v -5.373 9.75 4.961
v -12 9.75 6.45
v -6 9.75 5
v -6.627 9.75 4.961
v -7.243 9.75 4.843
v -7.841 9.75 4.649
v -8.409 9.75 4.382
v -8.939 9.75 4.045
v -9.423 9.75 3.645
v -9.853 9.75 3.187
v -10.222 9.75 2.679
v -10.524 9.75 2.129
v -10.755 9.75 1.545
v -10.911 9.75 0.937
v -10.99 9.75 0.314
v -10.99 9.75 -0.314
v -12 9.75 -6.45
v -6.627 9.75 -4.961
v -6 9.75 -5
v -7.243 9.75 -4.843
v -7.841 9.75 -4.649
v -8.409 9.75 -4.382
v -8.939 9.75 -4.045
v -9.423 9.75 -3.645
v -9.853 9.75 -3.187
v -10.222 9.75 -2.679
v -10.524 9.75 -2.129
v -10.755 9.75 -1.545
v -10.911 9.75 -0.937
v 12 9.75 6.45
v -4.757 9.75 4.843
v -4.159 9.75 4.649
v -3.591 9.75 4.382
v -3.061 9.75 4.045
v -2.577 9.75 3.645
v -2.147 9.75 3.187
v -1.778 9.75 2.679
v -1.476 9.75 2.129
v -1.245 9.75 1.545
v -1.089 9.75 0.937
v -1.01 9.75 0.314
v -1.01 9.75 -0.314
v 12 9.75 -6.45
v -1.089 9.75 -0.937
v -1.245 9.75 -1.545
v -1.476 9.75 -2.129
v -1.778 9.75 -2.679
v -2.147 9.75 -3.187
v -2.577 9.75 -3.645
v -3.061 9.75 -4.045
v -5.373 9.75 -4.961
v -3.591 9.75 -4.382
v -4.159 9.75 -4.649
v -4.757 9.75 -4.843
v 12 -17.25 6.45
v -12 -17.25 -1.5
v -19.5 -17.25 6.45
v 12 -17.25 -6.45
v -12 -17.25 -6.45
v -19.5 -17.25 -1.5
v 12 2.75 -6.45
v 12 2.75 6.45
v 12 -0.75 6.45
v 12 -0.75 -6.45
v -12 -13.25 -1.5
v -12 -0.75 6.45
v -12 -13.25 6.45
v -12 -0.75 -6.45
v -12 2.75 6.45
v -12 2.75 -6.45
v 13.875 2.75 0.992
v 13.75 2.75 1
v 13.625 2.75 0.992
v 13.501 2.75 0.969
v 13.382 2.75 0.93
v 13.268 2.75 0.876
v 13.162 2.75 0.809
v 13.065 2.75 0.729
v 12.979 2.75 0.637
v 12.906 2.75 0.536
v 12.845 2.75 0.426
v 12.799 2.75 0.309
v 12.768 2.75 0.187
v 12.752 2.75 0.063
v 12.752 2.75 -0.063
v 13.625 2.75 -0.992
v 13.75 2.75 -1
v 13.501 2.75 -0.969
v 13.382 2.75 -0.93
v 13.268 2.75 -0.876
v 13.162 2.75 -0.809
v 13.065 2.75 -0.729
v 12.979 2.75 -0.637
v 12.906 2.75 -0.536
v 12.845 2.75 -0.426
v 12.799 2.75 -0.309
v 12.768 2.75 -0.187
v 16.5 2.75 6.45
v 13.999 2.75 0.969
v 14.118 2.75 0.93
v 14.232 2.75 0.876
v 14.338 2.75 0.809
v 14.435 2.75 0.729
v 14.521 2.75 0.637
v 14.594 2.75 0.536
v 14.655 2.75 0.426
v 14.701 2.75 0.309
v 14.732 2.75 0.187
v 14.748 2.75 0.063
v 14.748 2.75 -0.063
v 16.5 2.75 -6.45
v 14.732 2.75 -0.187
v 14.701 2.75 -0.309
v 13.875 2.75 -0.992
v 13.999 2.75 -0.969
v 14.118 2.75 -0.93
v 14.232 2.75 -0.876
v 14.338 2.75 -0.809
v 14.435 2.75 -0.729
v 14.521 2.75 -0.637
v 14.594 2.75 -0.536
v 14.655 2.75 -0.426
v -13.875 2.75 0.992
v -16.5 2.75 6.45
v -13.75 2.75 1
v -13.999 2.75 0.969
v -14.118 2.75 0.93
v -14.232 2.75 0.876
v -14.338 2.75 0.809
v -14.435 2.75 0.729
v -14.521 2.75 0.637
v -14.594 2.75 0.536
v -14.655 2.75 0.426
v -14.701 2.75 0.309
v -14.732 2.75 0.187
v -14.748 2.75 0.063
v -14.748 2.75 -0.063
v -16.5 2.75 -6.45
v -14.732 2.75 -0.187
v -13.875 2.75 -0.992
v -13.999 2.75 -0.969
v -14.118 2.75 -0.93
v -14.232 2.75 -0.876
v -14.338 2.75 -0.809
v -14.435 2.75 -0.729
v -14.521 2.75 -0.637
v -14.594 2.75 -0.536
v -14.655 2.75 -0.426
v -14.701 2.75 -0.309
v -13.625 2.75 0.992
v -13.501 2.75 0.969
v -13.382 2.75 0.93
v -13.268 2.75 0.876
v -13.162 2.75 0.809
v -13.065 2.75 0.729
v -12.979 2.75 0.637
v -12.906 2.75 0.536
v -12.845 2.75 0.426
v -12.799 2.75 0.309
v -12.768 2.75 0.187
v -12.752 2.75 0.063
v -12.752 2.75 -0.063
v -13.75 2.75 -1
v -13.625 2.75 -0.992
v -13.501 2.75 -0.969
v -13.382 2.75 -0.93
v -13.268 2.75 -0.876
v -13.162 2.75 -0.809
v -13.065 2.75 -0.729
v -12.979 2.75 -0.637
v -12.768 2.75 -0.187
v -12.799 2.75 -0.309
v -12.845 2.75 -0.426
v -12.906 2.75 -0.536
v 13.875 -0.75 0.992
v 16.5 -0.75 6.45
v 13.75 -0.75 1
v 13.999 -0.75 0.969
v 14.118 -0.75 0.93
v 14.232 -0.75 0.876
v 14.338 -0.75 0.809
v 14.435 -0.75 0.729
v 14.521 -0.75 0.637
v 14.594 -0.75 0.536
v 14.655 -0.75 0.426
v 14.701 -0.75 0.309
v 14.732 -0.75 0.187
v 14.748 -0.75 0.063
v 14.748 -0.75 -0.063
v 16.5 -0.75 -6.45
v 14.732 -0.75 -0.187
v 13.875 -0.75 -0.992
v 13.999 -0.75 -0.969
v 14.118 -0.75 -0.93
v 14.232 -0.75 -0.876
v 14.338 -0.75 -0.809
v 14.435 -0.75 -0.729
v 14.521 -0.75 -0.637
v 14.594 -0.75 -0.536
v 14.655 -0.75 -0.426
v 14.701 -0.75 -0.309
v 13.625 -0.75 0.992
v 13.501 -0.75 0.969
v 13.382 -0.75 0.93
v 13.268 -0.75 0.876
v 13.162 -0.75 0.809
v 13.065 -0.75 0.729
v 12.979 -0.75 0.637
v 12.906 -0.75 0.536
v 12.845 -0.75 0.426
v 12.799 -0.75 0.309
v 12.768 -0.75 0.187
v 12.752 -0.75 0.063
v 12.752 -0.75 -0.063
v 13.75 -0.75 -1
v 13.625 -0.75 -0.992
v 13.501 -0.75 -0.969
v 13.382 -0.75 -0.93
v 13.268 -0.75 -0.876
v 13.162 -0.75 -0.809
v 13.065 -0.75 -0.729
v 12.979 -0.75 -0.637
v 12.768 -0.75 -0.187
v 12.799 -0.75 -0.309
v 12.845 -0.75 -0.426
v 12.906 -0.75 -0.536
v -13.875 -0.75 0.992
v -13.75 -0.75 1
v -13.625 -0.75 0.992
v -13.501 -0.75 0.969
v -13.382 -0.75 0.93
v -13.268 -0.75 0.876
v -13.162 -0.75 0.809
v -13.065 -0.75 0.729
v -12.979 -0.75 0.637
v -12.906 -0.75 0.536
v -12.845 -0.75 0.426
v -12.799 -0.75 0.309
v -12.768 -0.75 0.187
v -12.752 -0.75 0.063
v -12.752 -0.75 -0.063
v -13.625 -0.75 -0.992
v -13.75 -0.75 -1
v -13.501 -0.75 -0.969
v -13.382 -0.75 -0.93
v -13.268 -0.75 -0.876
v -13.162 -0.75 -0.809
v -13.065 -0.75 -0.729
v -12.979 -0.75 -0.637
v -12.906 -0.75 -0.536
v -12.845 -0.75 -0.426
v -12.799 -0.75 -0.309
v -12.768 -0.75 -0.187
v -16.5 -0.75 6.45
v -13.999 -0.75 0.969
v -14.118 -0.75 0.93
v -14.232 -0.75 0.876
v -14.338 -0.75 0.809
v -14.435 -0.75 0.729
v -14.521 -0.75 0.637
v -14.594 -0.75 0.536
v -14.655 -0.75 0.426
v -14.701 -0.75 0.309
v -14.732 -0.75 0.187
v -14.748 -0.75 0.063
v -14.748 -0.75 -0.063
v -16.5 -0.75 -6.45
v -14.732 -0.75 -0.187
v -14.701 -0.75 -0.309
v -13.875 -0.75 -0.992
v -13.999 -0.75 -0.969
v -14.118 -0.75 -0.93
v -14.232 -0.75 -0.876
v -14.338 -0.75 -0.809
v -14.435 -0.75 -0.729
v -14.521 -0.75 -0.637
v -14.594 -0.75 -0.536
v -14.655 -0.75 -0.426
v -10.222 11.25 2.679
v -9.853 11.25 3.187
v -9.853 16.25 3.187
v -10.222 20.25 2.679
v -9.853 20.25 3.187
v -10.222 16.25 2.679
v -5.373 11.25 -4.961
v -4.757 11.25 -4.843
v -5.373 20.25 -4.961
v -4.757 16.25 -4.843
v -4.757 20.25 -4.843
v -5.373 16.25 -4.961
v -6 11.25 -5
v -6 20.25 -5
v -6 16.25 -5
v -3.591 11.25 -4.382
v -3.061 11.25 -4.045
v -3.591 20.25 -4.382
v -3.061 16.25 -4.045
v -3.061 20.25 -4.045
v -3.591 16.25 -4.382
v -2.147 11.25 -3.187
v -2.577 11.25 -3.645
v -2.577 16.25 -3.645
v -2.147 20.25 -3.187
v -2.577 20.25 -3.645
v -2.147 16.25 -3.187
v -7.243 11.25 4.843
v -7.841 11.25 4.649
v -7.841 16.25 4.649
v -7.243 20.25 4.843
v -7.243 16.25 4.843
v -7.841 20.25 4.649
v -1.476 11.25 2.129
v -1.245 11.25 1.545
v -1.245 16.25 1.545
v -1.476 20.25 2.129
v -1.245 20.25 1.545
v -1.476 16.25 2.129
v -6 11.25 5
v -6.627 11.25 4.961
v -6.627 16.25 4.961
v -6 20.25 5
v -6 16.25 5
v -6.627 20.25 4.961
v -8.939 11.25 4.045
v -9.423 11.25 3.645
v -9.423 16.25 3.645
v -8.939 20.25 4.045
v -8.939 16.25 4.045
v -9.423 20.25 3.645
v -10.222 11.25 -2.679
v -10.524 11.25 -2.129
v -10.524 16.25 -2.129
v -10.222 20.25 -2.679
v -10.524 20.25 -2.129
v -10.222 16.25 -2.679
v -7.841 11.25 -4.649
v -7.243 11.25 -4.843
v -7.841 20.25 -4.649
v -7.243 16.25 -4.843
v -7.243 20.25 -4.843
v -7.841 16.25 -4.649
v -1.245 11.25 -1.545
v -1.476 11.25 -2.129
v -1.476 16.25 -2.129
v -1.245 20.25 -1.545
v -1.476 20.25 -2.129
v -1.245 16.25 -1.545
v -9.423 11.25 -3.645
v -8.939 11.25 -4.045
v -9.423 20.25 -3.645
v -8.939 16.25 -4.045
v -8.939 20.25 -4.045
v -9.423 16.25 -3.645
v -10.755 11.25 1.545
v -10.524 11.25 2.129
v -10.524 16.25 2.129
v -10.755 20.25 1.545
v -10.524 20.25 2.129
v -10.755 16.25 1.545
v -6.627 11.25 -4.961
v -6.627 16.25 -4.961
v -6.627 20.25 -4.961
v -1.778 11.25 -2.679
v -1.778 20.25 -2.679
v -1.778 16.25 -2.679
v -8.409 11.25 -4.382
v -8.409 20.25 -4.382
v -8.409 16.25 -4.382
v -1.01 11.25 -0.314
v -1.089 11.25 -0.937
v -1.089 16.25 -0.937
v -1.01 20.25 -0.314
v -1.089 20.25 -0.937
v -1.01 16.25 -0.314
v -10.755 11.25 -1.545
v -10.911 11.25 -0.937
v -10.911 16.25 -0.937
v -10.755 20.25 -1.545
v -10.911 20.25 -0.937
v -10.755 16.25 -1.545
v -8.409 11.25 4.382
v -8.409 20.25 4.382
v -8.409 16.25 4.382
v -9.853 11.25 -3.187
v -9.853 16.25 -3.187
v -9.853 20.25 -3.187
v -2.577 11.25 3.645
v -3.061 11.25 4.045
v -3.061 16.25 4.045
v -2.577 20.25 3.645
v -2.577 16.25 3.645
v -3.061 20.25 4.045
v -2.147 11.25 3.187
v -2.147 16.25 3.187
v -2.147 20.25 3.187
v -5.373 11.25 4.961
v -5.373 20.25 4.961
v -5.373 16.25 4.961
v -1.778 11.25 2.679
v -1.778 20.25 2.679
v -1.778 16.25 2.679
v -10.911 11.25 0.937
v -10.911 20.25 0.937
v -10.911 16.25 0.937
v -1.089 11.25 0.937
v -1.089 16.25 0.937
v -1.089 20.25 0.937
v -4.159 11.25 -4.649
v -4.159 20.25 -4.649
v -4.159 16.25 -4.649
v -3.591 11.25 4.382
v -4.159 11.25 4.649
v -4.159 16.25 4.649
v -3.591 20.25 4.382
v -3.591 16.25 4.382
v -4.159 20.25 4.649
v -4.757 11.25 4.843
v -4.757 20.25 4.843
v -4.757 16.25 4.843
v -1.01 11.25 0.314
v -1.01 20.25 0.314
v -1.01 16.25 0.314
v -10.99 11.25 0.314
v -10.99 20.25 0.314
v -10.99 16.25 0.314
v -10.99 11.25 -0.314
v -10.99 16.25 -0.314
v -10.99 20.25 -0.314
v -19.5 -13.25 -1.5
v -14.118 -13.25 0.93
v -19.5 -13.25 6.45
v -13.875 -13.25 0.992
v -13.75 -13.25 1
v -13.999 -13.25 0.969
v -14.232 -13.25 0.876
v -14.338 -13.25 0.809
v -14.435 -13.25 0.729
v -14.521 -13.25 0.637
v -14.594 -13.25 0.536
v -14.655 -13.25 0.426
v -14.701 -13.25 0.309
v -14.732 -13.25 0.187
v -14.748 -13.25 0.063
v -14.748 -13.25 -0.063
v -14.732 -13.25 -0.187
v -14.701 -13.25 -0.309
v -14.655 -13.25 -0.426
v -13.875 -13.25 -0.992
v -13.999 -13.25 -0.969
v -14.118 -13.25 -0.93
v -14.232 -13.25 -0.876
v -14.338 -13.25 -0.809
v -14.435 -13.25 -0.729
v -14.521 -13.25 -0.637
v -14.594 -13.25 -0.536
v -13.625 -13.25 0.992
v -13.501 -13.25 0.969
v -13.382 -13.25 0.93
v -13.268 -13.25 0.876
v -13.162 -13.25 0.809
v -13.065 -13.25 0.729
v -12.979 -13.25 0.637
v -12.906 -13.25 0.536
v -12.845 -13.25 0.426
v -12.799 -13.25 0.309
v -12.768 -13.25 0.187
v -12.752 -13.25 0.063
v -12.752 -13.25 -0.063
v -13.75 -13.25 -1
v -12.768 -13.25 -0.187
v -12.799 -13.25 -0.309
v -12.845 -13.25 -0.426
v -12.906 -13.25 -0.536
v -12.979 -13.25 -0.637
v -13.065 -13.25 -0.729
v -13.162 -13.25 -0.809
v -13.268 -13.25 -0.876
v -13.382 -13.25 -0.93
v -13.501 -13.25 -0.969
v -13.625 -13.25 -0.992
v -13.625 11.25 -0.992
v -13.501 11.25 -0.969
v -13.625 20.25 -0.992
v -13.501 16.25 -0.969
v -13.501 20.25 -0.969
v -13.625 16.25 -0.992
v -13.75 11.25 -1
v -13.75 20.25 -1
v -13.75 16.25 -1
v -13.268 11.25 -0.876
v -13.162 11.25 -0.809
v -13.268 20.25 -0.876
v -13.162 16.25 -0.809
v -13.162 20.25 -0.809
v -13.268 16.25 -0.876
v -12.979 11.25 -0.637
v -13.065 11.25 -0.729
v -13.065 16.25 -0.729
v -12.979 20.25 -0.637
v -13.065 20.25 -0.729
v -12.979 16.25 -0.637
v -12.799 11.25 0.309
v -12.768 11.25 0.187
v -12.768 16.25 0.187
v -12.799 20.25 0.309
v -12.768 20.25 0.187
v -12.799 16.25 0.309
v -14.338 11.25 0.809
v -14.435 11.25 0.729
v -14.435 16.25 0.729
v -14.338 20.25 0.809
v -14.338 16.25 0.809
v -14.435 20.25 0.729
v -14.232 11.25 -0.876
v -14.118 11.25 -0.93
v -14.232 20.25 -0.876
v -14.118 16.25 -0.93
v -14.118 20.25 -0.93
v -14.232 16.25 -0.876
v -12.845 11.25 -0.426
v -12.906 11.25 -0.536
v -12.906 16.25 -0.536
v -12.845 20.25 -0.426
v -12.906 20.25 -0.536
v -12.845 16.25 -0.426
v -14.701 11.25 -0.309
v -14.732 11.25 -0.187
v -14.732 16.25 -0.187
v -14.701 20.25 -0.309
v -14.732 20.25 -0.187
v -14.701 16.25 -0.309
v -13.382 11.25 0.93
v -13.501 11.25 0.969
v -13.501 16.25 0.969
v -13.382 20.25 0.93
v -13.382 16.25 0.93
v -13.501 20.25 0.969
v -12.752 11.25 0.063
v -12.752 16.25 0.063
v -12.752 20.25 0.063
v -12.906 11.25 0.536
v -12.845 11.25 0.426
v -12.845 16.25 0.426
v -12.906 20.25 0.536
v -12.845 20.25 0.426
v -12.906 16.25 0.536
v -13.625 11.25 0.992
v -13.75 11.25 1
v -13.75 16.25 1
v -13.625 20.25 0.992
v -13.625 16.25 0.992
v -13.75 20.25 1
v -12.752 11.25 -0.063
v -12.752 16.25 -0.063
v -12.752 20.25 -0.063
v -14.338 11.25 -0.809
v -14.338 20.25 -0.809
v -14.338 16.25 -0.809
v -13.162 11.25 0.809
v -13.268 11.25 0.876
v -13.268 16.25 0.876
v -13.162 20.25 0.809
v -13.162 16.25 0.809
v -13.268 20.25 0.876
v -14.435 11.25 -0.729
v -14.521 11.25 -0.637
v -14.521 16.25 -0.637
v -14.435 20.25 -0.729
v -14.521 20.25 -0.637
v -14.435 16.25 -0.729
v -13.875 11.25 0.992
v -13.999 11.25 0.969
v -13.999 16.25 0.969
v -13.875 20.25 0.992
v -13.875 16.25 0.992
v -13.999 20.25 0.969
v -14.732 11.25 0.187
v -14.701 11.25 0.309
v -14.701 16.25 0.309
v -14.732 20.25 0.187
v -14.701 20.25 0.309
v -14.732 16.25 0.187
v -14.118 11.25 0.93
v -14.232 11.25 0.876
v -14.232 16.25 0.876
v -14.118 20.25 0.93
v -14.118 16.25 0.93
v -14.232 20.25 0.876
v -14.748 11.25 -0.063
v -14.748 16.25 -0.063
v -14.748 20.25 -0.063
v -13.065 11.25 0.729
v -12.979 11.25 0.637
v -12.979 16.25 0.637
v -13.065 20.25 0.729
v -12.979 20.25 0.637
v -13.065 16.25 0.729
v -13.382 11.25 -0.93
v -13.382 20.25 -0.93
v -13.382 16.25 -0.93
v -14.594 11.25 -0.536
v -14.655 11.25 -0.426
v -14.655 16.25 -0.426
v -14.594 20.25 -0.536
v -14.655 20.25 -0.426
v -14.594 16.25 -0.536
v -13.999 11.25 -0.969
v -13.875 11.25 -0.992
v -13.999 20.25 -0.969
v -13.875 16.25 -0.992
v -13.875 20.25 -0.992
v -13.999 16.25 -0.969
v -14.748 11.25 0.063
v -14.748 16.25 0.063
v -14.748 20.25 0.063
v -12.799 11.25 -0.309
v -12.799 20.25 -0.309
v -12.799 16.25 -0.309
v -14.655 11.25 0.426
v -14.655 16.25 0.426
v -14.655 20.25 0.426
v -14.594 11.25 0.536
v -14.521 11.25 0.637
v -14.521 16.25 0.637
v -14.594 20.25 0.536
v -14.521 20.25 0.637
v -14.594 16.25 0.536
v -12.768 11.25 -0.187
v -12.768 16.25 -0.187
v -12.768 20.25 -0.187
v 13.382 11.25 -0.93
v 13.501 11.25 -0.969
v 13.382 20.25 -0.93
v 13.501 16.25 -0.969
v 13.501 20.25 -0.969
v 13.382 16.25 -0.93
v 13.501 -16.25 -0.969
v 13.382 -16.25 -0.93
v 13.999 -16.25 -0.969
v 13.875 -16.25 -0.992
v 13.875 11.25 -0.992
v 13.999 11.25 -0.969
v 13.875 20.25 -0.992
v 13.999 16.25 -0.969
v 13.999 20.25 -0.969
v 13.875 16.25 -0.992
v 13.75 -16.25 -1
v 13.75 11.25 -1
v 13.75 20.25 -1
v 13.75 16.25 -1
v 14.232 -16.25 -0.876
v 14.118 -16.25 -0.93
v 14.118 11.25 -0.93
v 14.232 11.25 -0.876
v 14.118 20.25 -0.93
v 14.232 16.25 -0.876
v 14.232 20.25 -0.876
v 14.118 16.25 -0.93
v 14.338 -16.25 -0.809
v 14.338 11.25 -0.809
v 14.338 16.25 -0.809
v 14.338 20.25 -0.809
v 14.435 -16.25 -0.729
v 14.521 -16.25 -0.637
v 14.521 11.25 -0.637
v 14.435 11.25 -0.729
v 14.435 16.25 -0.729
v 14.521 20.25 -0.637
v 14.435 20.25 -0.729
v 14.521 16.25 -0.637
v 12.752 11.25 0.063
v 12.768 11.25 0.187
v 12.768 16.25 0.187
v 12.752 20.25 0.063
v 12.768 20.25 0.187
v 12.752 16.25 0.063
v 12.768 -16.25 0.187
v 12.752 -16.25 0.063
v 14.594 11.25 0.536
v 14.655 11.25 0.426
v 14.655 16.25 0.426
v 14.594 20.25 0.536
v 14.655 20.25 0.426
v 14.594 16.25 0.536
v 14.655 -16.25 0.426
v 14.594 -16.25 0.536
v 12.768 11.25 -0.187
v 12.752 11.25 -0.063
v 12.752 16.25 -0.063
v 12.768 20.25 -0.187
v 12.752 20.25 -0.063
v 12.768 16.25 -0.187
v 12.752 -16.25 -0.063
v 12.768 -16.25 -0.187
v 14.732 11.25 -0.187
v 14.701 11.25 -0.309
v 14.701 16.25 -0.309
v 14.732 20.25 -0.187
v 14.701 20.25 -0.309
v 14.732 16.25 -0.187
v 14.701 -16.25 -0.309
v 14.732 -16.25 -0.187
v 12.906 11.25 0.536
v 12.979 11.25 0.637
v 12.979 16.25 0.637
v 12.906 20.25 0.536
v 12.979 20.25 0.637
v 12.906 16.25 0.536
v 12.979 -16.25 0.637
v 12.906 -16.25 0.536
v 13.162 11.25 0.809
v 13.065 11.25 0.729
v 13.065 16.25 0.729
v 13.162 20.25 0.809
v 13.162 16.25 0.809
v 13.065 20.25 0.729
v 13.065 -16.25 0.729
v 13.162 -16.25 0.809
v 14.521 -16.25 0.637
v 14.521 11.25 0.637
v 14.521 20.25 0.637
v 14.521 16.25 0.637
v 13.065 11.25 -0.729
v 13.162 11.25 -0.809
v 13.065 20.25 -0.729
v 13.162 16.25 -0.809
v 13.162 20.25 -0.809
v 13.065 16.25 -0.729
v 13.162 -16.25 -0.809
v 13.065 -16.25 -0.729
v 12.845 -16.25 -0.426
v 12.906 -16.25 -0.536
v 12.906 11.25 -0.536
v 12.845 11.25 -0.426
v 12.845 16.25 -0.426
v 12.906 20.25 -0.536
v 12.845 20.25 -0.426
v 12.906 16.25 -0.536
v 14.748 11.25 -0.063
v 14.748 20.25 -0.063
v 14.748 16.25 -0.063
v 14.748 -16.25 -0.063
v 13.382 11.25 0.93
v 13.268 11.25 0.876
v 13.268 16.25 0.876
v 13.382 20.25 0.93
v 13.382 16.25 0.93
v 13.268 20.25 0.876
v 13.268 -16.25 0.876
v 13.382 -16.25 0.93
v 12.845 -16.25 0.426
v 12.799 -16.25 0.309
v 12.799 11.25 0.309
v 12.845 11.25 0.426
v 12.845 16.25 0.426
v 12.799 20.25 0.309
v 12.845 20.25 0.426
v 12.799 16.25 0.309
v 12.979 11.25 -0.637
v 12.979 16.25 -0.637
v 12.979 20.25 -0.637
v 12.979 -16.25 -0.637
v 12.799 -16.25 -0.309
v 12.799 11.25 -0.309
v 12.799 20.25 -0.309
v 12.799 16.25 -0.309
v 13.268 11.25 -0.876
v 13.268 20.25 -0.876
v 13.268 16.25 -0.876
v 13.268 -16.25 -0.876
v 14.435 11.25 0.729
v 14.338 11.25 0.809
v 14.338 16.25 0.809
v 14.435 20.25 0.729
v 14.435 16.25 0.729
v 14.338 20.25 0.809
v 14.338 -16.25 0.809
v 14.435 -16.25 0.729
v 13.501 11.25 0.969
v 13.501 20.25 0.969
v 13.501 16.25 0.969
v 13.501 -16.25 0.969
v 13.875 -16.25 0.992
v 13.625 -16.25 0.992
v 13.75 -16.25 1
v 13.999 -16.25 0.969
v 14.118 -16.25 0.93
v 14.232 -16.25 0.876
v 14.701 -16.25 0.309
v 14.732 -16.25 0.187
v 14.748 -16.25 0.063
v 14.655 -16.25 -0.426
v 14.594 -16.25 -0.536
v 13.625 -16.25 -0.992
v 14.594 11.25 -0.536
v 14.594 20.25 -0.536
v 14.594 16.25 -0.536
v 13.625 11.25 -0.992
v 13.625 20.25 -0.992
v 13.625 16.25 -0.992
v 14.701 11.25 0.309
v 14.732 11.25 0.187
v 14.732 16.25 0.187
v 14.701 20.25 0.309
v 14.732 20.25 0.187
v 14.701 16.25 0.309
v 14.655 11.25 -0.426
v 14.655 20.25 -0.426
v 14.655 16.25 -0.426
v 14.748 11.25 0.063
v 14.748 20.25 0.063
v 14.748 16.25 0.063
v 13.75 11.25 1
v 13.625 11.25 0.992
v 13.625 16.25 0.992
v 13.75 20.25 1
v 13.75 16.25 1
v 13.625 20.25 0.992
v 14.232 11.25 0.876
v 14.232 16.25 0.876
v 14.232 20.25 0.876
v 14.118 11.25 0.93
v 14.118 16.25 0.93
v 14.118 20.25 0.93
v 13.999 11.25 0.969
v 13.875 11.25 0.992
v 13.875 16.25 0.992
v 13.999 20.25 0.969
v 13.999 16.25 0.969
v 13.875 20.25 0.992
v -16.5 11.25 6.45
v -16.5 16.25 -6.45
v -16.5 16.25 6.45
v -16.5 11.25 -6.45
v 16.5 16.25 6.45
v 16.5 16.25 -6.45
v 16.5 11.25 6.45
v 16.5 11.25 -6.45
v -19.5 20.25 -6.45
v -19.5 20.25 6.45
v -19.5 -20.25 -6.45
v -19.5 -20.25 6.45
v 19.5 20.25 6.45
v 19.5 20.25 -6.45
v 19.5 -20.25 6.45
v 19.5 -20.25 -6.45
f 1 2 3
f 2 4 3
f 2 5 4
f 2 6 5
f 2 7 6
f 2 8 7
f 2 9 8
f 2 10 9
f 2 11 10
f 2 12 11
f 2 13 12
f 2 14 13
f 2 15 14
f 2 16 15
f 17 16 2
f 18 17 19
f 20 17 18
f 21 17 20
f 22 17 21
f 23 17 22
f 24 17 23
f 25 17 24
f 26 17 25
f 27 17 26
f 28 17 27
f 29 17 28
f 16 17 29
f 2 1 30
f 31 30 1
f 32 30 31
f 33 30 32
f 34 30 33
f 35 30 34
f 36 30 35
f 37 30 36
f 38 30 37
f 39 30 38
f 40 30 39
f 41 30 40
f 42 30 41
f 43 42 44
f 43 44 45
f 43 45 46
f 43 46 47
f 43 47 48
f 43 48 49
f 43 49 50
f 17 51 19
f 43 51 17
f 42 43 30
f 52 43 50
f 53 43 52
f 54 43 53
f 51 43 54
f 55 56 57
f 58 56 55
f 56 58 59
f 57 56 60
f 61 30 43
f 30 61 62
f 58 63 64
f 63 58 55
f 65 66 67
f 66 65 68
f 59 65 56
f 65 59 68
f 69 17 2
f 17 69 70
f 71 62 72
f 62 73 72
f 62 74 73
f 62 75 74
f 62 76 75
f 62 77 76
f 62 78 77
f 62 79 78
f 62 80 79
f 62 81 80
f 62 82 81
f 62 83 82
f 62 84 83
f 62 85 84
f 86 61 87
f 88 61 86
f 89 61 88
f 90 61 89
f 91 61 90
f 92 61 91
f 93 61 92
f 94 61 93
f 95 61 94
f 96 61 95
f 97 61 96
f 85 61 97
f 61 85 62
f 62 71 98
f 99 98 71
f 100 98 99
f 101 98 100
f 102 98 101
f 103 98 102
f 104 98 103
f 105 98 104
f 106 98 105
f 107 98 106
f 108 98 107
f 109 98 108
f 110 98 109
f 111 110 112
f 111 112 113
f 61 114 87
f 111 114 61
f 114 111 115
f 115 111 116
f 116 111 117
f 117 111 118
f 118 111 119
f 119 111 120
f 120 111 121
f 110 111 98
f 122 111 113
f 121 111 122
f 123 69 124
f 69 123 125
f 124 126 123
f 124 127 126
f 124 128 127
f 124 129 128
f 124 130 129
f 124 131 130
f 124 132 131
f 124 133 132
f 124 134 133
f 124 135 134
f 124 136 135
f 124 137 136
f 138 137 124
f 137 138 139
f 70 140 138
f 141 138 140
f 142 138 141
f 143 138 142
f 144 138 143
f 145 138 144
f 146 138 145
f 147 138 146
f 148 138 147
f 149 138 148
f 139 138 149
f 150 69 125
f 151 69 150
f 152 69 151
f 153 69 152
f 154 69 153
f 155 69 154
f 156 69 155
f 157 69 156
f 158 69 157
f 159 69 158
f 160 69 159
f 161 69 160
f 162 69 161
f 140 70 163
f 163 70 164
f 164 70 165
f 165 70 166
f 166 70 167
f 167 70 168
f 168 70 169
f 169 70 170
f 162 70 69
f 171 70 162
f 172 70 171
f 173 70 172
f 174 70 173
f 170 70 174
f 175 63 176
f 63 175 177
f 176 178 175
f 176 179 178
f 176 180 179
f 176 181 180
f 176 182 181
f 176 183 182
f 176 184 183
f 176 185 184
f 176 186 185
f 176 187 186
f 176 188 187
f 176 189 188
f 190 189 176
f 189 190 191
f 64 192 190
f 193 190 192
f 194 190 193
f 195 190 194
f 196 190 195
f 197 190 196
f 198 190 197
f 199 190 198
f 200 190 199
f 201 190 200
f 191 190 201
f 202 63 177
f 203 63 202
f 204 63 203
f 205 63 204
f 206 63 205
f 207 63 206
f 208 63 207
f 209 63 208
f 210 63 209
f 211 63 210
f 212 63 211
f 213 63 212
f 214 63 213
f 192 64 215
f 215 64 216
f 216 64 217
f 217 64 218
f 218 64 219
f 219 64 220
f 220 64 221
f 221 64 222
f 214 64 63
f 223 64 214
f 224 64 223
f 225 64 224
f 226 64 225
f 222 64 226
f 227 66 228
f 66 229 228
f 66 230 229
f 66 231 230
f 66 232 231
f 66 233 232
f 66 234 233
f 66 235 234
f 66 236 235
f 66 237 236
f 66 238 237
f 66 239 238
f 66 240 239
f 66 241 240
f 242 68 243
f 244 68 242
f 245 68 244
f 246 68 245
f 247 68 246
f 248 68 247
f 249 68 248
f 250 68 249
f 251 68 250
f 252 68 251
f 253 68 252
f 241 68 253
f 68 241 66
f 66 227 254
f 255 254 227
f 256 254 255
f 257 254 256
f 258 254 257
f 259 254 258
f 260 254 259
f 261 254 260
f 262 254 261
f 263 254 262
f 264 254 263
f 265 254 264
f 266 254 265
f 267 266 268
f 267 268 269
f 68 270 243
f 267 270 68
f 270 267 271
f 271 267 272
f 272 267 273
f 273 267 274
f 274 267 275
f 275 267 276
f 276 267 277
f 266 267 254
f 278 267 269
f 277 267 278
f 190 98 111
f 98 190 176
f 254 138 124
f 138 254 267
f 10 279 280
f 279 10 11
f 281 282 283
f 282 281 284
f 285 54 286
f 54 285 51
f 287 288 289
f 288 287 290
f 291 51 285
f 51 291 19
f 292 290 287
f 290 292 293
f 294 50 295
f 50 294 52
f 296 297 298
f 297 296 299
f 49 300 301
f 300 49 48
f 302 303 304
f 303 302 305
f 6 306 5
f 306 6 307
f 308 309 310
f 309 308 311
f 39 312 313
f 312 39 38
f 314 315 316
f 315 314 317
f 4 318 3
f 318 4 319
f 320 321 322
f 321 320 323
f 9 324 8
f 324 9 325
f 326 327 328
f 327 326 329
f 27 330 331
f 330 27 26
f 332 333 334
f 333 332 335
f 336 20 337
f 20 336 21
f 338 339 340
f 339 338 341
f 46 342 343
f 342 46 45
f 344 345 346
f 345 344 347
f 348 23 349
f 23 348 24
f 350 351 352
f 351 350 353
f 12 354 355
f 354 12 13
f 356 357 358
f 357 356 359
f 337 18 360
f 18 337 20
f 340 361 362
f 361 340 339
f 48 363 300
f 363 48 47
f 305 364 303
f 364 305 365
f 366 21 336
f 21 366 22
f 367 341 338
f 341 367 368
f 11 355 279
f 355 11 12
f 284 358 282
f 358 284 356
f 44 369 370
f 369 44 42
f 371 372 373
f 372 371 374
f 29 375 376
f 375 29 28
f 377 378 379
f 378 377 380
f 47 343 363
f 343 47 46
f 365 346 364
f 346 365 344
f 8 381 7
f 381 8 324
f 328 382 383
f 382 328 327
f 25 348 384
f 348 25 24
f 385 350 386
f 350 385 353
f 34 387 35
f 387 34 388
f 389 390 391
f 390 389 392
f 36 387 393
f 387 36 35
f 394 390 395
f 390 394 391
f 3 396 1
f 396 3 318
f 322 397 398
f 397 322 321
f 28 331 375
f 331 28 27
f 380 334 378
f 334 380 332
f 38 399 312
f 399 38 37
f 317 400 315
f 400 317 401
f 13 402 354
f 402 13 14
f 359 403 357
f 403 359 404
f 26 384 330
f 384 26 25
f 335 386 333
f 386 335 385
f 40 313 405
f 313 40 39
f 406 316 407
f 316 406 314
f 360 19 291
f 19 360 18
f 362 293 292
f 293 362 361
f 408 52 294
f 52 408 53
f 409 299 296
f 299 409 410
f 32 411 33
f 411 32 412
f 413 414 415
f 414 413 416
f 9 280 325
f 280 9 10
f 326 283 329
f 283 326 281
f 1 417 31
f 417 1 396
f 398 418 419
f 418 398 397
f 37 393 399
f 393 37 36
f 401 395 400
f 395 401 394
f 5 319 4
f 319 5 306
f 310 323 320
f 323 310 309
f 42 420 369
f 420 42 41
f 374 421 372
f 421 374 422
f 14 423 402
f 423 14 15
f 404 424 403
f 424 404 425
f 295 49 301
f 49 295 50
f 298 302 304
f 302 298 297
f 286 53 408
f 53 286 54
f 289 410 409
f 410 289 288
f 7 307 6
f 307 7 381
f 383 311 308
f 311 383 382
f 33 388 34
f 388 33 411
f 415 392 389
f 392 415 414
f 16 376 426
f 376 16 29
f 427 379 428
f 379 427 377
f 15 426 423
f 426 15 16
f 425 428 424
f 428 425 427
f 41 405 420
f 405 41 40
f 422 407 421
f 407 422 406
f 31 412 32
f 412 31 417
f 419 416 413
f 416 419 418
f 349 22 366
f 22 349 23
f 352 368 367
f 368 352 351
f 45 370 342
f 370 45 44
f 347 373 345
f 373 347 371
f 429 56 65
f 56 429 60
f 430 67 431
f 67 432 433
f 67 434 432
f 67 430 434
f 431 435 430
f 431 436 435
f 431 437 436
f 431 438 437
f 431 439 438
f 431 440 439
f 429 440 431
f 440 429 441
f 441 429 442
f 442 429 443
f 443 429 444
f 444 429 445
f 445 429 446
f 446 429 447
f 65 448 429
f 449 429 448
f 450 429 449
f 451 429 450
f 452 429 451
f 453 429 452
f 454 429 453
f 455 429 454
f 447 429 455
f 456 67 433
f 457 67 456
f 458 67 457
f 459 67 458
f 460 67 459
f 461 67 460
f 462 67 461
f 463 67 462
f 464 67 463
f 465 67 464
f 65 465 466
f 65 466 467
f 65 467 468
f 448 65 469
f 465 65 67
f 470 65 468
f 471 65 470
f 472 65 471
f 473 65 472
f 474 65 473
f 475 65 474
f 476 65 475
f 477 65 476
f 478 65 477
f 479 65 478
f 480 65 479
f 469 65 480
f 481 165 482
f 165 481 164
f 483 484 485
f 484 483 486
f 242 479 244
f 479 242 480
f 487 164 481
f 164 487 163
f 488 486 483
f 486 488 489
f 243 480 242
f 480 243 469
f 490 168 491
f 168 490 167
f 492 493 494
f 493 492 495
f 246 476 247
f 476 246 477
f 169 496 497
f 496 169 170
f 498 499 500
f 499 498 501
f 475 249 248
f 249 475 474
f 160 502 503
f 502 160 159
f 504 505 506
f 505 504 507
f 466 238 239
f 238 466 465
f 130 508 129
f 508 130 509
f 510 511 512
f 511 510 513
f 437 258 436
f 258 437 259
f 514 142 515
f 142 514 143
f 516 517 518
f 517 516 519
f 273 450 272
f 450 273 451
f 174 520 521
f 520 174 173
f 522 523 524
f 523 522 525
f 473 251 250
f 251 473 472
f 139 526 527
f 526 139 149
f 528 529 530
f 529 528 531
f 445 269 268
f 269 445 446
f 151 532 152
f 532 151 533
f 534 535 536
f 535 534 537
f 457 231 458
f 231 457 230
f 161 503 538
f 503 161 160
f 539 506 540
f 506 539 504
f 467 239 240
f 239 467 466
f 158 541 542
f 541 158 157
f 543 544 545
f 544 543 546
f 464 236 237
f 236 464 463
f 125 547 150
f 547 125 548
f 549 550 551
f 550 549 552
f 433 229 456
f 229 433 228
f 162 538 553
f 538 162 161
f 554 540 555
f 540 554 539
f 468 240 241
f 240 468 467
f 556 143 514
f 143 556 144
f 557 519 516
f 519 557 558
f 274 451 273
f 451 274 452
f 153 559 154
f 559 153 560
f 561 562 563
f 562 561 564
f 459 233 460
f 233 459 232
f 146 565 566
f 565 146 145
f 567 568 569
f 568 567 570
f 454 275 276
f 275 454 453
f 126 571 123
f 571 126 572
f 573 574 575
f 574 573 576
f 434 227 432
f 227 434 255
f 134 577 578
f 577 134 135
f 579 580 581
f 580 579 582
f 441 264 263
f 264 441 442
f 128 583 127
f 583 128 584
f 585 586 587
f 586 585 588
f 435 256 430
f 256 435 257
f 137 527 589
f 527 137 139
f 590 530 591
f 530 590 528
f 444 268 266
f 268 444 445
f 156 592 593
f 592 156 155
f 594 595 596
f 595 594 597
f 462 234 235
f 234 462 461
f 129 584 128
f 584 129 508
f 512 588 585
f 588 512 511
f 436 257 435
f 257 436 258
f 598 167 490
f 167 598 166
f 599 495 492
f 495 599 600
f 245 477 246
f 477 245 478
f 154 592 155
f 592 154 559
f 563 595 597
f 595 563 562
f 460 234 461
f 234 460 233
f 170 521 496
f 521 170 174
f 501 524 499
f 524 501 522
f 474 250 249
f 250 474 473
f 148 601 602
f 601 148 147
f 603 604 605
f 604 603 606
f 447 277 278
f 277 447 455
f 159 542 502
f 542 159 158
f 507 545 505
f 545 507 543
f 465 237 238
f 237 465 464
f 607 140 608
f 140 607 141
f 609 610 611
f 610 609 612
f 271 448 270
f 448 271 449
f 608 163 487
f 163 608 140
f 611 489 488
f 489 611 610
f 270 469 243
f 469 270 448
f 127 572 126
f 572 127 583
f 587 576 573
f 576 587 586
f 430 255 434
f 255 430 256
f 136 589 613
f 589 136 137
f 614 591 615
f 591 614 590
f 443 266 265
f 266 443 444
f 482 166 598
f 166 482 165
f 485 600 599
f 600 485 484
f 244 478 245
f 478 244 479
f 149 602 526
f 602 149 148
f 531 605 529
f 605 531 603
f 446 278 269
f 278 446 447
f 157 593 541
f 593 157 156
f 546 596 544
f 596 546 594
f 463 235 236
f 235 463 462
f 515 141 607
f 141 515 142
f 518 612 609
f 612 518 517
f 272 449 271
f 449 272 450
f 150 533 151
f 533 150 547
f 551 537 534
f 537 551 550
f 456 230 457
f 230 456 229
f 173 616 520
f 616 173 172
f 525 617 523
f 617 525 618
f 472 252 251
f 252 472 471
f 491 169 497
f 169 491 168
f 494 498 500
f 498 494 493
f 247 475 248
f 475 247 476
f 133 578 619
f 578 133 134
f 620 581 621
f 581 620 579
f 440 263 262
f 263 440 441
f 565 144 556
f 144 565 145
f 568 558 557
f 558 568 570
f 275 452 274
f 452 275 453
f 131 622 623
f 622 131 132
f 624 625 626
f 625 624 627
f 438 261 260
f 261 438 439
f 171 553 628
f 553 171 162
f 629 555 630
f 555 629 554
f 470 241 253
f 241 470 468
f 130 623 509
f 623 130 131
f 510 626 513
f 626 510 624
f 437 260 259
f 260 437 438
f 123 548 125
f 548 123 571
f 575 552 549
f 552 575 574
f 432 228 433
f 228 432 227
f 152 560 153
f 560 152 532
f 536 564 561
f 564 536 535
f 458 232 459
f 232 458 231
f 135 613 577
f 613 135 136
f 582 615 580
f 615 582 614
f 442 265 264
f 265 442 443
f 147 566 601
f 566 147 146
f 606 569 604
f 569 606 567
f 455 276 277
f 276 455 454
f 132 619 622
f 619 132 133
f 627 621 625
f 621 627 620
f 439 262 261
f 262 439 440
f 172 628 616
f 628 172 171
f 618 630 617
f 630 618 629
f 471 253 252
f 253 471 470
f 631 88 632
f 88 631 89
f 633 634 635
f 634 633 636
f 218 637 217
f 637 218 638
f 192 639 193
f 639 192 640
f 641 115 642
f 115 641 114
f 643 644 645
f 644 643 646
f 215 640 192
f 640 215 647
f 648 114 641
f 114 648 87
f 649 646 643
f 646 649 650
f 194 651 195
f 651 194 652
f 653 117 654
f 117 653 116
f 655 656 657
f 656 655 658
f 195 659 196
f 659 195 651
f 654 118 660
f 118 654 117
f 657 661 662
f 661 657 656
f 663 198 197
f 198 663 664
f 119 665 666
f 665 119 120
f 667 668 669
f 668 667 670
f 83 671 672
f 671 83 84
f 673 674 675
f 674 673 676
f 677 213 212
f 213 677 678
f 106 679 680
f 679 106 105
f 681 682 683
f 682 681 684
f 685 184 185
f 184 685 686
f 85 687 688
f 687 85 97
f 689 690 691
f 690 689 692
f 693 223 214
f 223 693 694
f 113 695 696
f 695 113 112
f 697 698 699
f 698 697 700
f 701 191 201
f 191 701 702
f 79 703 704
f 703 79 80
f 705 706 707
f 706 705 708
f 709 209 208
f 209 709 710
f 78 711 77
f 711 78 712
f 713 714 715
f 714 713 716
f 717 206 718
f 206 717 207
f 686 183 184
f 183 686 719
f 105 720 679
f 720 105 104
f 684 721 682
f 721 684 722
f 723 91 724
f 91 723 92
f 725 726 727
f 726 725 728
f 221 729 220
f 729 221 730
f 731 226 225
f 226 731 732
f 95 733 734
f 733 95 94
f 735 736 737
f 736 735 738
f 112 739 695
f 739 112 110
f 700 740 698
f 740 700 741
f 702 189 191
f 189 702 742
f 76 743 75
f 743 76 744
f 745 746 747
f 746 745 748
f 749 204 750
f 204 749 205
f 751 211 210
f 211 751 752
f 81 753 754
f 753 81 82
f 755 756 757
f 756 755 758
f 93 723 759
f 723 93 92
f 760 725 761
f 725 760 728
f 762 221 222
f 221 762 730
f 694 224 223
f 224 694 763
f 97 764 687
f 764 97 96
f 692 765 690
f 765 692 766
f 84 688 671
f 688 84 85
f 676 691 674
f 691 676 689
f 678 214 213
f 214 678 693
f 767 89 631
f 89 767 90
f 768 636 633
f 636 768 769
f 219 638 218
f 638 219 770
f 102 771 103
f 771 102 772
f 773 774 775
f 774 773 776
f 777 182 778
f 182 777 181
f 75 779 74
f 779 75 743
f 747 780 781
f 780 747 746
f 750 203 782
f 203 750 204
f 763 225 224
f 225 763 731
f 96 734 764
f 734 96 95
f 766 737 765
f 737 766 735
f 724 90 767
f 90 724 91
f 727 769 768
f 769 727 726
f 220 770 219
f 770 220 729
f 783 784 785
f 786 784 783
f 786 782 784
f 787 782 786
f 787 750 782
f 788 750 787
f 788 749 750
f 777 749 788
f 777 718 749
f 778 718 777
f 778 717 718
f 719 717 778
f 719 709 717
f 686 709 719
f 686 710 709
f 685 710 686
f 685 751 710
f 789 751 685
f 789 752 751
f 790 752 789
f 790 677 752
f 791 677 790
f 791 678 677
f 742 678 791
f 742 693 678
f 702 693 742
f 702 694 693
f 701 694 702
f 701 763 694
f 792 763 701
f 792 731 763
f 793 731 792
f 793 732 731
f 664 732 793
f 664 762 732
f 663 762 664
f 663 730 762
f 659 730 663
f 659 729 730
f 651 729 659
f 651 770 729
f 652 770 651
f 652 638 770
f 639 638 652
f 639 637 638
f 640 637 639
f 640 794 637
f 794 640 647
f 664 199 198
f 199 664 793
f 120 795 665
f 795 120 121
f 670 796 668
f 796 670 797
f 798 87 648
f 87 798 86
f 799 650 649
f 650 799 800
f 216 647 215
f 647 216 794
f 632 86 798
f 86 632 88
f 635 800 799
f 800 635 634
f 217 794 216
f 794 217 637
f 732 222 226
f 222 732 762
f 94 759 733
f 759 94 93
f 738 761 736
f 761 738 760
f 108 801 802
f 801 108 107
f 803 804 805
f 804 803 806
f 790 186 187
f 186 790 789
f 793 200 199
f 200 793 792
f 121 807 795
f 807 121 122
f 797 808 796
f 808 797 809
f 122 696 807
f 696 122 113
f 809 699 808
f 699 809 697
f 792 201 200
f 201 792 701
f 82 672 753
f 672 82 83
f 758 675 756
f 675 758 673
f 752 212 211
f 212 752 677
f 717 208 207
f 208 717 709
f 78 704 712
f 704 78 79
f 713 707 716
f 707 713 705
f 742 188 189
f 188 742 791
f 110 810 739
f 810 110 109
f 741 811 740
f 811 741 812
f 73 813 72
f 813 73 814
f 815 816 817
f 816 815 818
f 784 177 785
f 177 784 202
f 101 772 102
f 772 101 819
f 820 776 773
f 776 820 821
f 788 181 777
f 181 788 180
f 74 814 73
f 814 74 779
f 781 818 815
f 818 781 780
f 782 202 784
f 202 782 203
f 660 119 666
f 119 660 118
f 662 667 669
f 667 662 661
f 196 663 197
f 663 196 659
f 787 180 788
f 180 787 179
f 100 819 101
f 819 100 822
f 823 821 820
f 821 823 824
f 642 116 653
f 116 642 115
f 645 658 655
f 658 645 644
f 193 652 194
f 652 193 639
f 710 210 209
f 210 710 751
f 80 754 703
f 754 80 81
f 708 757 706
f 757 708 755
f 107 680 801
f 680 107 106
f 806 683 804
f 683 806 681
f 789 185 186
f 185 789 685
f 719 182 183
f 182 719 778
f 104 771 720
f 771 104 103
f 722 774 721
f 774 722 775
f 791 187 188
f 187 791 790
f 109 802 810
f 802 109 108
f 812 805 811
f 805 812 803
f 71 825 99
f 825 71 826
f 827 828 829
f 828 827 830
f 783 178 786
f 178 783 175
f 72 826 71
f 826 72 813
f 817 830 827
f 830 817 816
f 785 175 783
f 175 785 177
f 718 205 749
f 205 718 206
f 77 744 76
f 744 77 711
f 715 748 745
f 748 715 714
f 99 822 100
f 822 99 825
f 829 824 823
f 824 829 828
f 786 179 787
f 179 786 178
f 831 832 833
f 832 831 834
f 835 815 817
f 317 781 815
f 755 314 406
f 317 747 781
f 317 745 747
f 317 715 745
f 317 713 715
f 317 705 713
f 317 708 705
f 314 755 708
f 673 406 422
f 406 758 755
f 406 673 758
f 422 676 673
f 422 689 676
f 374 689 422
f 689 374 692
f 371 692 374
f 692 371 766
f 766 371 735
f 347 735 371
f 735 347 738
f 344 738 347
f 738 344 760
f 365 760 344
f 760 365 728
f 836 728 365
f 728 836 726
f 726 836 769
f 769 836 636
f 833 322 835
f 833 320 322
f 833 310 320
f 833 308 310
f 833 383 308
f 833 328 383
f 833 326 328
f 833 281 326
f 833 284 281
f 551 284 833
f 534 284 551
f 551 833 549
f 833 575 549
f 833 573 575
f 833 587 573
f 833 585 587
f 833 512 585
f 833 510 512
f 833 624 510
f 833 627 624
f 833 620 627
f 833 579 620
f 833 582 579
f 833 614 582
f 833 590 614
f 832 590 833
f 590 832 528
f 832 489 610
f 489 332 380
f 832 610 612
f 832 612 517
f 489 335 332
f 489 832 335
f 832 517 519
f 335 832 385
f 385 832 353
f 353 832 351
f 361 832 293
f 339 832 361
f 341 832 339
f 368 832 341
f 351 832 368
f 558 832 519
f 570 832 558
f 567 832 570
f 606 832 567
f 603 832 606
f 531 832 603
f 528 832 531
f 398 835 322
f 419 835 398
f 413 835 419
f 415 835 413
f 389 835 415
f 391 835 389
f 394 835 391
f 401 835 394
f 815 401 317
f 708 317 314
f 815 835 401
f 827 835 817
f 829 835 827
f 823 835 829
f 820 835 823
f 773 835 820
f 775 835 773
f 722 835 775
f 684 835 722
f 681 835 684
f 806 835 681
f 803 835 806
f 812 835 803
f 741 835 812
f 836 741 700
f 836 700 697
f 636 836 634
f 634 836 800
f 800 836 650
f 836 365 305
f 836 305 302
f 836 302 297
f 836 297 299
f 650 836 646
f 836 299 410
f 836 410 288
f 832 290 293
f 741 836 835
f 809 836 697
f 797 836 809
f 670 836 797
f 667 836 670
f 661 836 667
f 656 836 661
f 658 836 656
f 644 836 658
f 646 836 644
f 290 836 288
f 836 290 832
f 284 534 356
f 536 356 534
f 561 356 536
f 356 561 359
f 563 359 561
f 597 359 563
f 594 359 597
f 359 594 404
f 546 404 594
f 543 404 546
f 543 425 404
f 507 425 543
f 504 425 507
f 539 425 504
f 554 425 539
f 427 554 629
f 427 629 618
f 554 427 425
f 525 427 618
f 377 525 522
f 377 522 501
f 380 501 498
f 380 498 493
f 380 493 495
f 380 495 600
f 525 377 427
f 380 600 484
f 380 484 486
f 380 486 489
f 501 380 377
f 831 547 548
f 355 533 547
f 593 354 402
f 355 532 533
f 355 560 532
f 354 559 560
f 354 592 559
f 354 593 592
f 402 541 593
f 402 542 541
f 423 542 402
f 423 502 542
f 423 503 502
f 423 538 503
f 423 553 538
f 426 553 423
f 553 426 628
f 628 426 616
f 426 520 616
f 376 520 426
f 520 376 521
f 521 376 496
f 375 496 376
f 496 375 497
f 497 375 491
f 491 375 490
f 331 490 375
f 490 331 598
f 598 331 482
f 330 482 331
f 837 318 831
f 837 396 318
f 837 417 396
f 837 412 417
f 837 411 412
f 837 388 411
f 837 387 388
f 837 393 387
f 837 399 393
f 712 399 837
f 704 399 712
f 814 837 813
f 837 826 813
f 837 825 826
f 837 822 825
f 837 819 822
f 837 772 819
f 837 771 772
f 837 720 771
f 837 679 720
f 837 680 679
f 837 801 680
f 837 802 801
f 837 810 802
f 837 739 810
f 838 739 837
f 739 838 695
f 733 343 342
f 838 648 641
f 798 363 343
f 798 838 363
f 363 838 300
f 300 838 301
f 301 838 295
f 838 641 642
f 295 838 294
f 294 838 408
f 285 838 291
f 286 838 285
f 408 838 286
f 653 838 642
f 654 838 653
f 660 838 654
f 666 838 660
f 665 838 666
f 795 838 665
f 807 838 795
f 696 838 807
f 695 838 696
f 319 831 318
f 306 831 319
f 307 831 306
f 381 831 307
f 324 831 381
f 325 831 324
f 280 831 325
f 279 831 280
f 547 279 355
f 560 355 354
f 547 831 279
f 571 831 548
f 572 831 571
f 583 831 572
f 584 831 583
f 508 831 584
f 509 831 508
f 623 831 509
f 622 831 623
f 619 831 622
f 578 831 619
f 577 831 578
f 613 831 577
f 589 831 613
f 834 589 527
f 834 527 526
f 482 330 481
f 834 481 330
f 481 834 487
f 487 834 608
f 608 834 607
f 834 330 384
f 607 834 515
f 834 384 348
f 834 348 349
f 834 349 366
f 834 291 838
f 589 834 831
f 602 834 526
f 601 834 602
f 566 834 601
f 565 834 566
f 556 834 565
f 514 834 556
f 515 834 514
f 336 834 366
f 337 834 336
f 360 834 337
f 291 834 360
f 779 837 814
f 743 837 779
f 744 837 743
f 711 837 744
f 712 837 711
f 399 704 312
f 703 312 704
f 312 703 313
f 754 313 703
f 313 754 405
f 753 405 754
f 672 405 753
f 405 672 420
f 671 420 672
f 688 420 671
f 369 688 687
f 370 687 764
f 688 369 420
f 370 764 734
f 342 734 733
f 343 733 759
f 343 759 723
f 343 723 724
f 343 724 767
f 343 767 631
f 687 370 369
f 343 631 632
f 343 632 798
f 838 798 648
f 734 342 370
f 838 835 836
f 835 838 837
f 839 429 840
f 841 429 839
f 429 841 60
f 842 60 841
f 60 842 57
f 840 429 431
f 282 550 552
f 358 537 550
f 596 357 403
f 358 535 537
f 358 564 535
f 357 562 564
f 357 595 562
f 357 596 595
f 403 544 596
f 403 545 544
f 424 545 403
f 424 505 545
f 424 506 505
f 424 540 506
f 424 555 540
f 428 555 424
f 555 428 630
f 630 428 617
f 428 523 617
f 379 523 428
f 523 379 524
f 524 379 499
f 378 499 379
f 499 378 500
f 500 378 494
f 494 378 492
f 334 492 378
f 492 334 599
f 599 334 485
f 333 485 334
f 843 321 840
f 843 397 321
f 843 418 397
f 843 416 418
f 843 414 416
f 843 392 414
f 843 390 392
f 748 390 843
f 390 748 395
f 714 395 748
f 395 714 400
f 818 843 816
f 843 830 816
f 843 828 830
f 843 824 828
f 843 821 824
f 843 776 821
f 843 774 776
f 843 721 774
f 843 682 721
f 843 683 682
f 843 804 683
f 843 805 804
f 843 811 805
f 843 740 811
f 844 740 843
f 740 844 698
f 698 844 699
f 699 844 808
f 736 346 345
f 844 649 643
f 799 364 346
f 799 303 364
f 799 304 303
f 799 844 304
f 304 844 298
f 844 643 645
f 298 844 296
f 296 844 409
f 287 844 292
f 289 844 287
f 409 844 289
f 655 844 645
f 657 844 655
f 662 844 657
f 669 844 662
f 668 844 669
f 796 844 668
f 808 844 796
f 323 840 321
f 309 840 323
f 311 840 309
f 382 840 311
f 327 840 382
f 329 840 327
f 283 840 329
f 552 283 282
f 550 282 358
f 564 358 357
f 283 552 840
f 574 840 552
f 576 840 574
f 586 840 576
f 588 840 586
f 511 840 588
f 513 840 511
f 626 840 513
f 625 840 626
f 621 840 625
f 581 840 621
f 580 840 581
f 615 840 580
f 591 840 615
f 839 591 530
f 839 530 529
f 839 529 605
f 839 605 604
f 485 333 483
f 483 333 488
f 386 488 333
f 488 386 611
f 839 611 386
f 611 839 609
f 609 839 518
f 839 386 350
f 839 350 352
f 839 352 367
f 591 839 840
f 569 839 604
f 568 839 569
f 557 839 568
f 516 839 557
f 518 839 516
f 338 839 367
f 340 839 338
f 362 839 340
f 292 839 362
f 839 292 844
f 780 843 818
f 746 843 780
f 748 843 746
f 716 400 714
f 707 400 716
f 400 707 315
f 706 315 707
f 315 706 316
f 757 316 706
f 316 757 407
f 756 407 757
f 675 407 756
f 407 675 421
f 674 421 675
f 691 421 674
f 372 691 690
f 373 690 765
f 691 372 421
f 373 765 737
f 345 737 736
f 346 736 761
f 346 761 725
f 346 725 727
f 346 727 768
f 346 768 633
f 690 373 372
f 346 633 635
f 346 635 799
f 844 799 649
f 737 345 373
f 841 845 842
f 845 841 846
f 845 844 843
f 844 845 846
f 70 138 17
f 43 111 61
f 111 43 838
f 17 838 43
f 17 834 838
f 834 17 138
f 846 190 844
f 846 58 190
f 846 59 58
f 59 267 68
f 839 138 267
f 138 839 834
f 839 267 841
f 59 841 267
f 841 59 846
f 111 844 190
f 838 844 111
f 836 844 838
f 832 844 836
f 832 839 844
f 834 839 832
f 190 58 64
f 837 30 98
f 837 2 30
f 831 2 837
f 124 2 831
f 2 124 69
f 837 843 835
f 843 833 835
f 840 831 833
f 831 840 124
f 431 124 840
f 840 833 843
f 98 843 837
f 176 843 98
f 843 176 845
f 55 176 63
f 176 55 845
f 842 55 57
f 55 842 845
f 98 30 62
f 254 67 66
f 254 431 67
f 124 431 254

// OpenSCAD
lhsOrRhs=1; //Select Lhs or Rhs servo holder


$fn=50; //bigger = smoother/slower

//Parametric rc servo model
//Enetr dimensions as per jpg 
a=29.5;
b=24;
c=27;
d=13;
e=33;
f=16.5;
//g=32.3;
h=27.5;
i=20;
j=6;


mountingHoleDiameter=2;
mountingHoleDepth=19;
splineShaftDiameter=10;
splineShaftHeight=20;
cableHeight=4;
cableWidth=8;
cableLength=15;
//body
module body()
{
cube([d,b,c],center=false); 

//tabs
translate([0,-(e-b)/2,f])
{
    cube([d,e,(i-f)],center=false); 
}
//splineShaft
translate([d/2,j,c])
{
cylinder(h=splineShaftHeight,d=splineShaftDiameter,center=false);
}

//lead 
//translate([-cableWidth/2+d/2,-cableLength,0]) //centered
translate([0,-cableLength,0]) //offset
{
   cube([cableWidth,cableLength,cableHeight],center=false); 
}
}
module mountingHoles()
{
translate([d/2,-(h-b)/2,i-mountingHoleDepth])
{
    cylinder(h=mountingHoleDepth*2,d=mountingHoleDiameter,center=false);
    translate([0,h,0])
    {
      cylinder(h=mountingHoleDepth*2,d=mountingHoleDiameter,center=false); 
    }
}
}


module display()  //with holes for display only
{
    translate([-d/2,-j,0])//center model around spline shaft
    {
    difference()
    {
    body();
    mountingHoles();
    }
}
}
module RCServo() // with mounting hole geometry
{
    translate([-d/2,-j,-a])//center model around spline shaft edit
    {
    
    body();
    mountingHoles();
    
}
}







//Servo Holder made using Servo model

strength=3;
slotGap=5;
slotOffset=-1; //change to get slot in correct position
length=e+strength*2;
width=d-.1;
height=a+slotGap+strength*2;

module mount()
{
difference()
{

//mount
cube([length,width,height],center=true); 
union()
    {
//minus rcServo
translate([b/2-j,0,height/2-strength-slotGap])
rotate([0,0,90])
RCServo();

//minus slot for servo arm

//translate([0,0,height/2-slotGap-strength])
translate([0,0,a/2+slotOffset])
cube([length-strength*2,d,slotGap],center=true); 
    }
}
}

if(lhsOrRhs==0)
{
//lhs

rotate([-90,0,0])
mount();
}



if(lhsOrRhs==1)
{
//rhs

mirror([1,0,0])
rotate([-90,0,0])
mount();
}
